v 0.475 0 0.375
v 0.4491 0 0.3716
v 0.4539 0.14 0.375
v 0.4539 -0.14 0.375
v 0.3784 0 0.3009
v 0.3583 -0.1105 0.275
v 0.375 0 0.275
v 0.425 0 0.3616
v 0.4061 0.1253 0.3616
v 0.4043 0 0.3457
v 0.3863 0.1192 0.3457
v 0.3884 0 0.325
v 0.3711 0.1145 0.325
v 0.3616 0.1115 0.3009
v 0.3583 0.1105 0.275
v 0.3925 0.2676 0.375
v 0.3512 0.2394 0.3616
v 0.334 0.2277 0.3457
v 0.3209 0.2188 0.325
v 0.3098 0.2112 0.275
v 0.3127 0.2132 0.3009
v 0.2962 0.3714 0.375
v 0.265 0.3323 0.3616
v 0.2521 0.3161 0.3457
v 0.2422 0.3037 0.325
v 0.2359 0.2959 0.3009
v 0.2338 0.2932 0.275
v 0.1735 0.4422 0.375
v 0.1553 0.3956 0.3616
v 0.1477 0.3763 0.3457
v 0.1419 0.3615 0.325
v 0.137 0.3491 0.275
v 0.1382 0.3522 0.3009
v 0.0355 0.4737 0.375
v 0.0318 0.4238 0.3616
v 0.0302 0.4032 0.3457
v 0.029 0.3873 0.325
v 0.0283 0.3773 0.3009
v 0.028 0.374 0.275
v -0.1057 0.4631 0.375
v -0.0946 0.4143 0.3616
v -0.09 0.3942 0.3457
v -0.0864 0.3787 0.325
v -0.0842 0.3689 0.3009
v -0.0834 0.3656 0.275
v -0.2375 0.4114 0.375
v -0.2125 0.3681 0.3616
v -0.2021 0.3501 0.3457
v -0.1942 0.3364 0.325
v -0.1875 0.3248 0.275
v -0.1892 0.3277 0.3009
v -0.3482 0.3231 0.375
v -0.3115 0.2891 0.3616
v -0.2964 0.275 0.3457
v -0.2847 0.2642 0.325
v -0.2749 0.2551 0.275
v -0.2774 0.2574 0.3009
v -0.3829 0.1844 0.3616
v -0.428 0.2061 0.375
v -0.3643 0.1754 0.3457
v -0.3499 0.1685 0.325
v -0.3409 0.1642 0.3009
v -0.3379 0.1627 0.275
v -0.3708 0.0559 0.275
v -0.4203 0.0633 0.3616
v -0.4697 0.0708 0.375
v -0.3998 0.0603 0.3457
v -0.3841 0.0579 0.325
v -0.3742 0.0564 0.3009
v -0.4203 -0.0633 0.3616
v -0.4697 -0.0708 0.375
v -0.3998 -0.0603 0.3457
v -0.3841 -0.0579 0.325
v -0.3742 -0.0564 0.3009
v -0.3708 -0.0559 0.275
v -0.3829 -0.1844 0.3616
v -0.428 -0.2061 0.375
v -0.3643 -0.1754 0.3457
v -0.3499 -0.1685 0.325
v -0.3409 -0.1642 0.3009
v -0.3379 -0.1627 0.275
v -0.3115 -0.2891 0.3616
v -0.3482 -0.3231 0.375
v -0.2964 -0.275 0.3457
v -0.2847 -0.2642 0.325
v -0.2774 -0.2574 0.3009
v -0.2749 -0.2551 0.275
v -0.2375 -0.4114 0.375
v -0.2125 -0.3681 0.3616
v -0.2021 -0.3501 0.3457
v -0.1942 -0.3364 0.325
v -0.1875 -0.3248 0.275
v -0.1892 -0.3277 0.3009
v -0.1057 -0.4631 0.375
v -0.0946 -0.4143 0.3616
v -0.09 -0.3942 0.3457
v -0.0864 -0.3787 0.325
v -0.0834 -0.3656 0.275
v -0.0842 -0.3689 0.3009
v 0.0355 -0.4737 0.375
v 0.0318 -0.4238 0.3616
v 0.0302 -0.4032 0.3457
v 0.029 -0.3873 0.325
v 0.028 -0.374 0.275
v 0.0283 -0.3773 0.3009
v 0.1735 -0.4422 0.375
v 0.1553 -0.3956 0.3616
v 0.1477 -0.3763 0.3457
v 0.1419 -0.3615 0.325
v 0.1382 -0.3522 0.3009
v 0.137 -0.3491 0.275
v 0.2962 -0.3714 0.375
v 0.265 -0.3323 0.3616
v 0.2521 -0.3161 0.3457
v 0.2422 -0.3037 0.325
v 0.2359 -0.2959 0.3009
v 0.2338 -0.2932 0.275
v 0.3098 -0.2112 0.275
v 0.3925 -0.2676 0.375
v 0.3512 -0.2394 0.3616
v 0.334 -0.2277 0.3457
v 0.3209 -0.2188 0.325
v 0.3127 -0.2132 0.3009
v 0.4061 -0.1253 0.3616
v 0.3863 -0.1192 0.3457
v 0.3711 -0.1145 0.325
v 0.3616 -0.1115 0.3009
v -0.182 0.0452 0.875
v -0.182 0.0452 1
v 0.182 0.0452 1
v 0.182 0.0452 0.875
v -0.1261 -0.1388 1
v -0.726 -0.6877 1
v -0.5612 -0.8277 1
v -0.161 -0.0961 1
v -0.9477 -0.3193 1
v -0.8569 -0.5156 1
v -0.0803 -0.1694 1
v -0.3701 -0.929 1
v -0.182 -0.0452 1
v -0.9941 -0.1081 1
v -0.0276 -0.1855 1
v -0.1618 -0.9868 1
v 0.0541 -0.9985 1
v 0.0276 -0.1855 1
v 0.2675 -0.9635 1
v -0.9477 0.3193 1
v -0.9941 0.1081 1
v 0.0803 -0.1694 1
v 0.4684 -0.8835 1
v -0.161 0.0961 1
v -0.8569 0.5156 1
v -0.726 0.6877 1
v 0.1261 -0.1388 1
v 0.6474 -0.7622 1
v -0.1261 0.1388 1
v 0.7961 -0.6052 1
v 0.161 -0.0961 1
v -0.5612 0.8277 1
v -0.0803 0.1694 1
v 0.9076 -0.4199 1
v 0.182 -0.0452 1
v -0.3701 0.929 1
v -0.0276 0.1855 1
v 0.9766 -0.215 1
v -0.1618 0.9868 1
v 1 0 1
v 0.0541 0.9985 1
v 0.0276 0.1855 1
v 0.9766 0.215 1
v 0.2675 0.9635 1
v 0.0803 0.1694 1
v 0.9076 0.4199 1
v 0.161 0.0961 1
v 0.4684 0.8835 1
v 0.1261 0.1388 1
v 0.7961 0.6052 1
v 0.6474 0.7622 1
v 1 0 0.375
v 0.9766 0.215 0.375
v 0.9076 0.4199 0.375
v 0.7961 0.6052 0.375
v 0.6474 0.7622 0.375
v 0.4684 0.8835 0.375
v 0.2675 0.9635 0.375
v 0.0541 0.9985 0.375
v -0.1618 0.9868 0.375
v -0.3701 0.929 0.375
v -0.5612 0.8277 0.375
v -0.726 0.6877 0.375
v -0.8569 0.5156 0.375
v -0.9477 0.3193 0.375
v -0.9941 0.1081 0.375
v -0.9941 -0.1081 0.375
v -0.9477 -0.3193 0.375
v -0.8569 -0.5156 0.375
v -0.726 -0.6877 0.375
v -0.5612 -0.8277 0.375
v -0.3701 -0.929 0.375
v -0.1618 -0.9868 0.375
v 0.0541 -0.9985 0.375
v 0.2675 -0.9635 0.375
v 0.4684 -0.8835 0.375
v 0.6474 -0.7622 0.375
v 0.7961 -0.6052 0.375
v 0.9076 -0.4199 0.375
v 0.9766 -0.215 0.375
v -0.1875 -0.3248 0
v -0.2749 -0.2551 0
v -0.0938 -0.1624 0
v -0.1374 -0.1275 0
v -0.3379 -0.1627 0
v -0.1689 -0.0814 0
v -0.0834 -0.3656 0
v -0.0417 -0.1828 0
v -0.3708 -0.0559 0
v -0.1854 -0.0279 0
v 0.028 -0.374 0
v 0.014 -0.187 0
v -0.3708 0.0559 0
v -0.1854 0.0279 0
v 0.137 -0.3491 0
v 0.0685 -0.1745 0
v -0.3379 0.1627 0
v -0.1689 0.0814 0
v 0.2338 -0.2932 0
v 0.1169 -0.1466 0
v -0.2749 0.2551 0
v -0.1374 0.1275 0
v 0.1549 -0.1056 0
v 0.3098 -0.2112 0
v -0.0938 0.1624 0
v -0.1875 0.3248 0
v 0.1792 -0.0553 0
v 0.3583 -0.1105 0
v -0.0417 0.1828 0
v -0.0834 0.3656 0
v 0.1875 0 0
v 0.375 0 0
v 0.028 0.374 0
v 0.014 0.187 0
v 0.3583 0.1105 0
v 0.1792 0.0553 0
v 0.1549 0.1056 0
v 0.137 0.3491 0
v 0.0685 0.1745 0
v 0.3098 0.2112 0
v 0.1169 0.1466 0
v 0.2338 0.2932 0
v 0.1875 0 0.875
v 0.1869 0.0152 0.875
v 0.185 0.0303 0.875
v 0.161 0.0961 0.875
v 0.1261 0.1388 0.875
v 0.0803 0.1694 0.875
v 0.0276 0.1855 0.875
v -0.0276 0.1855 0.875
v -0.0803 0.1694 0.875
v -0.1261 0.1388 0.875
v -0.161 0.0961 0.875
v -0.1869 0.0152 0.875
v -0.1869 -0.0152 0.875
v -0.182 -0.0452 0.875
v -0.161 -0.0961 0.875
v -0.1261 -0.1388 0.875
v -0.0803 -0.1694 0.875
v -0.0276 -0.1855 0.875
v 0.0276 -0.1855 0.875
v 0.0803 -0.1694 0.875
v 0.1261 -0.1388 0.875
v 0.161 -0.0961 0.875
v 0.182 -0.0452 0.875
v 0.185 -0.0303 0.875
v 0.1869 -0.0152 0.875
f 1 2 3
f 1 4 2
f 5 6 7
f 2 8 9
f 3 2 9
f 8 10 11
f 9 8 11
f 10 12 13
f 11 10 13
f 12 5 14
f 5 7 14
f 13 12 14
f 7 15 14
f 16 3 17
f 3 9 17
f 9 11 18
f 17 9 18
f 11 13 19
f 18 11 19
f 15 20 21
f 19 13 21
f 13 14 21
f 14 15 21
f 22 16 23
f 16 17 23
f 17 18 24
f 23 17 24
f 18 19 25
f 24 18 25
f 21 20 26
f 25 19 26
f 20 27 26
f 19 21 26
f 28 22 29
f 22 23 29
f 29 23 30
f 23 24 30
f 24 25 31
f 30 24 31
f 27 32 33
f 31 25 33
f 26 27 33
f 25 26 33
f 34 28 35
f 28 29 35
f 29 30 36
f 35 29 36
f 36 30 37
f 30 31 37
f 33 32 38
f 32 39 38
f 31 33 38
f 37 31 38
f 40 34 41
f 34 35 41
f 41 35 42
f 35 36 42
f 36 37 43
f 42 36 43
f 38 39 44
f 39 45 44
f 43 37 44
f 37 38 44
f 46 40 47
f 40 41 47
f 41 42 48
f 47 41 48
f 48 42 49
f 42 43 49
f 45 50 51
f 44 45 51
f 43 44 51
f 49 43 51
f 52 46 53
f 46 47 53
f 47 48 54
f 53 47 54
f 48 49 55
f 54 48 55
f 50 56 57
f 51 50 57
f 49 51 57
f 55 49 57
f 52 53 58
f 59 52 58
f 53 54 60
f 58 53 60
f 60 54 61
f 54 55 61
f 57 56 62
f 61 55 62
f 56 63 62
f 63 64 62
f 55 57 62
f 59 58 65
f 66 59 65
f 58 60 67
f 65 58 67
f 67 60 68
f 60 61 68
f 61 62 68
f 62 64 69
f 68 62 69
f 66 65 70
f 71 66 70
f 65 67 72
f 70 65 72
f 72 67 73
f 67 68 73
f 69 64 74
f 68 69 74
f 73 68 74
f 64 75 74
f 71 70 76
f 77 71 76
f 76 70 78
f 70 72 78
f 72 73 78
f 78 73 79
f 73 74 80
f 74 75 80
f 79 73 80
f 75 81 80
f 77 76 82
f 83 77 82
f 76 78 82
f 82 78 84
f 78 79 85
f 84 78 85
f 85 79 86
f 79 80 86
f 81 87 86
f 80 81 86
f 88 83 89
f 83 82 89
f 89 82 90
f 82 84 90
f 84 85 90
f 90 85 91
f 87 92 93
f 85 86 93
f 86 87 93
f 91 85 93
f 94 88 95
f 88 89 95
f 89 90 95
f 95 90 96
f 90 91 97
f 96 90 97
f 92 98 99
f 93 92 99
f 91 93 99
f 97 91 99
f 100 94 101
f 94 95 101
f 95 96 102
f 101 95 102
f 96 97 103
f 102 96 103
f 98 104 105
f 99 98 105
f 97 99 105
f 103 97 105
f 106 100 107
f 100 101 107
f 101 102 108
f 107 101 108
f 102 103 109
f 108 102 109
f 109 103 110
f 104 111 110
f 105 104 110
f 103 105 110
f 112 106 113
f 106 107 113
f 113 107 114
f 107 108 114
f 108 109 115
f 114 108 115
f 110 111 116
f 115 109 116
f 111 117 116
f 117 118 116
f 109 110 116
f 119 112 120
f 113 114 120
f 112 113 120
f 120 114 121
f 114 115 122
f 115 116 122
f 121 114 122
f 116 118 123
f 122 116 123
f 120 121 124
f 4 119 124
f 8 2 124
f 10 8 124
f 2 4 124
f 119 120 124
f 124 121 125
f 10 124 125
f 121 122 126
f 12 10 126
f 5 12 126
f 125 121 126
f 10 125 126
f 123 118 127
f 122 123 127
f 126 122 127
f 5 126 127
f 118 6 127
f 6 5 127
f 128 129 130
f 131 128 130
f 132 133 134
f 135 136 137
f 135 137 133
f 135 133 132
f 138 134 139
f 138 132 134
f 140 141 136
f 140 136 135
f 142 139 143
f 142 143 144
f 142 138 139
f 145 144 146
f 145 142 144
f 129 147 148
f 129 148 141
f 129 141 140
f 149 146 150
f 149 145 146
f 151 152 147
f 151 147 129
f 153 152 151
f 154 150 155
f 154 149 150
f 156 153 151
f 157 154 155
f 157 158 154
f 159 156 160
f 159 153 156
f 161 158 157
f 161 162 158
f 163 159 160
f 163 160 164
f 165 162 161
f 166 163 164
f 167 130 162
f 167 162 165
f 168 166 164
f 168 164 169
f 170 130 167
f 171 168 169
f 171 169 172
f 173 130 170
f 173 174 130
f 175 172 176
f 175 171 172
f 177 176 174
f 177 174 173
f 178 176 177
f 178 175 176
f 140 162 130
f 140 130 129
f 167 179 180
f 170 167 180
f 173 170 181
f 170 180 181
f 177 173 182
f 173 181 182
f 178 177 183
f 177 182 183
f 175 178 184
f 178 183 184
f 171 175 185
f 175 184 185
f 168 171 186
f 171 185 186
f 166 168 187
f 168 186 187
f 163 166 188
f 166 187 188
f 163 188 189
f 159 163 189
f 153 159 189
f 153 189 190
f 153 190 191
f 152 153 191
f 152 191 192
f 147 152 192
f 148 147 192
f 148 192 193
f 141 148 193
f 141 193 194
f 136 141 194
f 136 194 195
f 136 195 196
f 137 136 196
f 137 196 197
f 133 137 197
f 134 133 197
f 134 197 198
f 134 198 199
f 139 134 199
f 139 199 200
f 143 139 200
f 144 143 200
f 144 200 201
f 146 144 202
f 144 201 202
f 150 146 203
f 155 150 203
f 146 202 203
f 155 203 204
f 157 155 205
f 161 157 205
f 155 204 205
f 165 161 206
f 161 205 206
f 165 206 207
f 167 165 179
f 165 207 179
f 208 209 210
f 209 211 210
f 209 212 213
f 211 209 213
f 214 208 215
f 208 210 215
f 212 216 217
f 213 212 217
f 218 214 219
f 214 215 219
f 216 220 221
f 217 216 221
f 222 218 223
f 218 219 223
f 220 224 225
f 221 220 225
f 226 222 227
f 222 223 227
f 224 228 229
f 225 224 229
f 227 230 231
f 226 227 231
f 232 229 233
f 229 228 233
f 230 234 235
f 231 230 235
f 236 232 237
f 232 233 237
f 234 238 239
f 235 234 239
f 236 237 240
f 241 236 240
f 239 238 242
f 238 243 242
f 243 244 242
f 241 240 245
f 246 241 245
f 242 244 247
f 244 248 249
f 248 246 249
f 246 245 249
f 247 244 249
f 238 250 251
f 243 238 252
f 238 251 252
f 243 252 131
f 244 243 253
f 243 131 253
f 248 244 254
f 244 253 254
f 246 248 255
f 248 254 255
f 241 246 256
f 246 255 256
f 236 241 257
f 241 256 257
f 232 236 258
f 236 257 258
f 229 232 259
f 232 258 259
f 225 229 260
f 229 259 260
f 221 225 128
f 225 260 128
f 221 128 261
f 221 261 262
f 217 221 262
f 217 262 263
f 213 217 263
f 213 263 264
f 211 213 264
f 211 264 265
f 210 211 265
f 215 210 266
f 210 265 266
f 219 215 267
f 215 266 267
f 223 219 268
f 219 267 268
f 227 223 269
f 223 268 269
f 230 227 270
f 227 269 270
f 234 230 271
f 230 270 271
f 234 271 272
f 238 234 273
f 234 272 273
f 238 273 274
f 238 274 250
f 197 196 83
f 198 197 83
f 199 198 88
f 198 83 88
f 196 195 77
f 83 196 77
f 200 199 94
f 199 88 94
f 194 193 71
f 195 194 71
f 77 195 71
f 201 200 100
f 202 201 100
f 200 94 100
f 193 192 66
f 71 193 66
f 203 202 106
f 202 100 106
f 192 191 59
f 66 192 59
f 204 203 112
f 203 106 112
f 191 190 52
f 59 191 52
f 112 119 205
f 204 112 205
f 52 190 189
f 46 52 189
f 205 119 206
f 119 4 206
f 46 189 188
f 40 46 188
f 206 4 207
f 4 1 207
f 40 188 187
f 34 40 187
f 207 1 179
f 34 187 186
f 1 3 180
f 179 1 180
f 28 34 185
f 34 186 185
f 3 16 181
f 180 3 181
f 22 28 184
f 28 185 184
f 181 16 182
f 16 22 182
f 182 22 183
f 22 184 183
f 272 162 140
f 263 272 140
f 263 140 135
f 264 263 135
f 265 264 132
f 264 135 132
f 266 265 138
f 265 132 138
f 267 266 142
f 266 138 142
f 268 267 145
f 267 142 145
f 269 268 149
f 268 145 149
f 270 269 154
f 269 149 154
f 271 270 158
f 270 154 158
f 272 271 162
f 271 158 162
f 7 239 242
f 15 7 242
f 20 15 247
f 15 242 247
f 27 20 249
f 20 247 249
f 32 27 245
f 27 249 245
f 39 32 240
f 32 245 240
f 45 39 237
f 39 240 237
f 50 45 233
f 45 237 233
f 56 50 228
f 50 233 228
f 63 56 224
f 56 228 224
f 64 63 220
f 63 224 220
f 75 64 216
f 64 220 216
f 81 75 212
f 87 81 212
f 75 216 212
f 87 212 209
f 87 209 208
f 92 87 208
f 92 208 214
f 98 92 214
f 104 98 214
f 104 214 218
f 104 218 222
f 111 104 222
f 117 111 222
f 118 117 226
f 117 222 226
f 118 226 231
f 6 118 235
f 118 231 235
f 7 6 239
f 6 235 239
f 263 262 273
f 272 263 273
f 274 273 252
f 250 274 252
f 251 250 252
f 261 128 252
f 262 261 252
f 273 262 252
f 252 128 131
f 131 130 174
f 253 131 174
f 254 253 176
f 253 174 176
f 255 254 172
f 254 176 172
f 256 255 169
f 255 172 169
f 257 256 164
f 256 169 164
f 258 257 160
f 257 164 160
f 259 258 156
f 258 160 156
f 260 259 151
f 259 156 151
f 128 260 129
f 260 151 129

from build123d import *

# Parameters (mm, degrees)
SKETCH1_R           = 1
BOSS_EXTRUDE1_DEPTH = 1
SKETCH2_R           = 1
SKETCH2_R_2         = 0.375
CUT_EXTRUDE1_DEPTH  = 0.375
FILLET1_R           = 0.1
CUT_EXTRUDE2_DEPTH  = 0.125
CUT_EXTRUDE3_START  = 0.875
SKETCH4_R           = 0.1875
CUT_EXTRUDE3_DEPTH  = 0.875


with BuildPart() as part:
    # Sketch1 → Boss-Extrude1 (new body)
    with BuildSketch(Plane.XY):
        Circle(SKETCH1_R)
    extrude(amount=BOSS_EXTRUDE1_DEPTH)

    # Sketch2 → Cut-Extrude1 (cut)
    with BuildSketch(Plane.XY):
        Circle(SKETCH2_R)
        Circle(SKETCH2_R_2, mode=Mode.SUBTRACT)
    extrude(amount=CUT_EXTRUDE1_DEPTH, mode=Mode.SUBTRACT)

    # Fillet1
    fillet1_edges = [part.edges().sort_by_distance(p)[0] for p in [
        (-0.375, 0, 0.375),
    ]]
    fillet(fillet1_edges, radius=FILLET1_R)

    # Sketch3 → Cut-Extrude2 (cut)
    with BuildSketch(Plane.XY.offset(1)):
        with BuildLine():
            Line((-0.181979478, 0.045163255), (0, 0.045163255))
            Line((0, 0.045163255), (0.181979478, 0.045163255))
            ThreePointArc((0.181979478, 0.045163255), (0, 0.1875), (-0.181979478, 0.045163255))
        make_face()
        with BuildLine():
            Line((0.181979478, -0.045163255), (0, -0.045163255))
            Line((0, -0.045163255), (-0.181979478, -0.045163255))
            ThreePointArc((-0.181979478, -0.045163255), (0, -0.1875), (0.181979478, -0.045163255))
        make_face()
    extrude(amount=-CUT_EXTRUDE2_DEPTH, mode=Mode.SUBTRACT)

    # Sketch4 → Cut-Extrude3 (cut)
    with BuildSketch(Plane.XY.offset(CUT_EXTRUDE3_START)):
        Circle(SKETCH4_R)
    extrude(amount=-CUT_EXTRUDE3_DEPTH, mode=Mode.SUBTRACT)


solid = part.part
